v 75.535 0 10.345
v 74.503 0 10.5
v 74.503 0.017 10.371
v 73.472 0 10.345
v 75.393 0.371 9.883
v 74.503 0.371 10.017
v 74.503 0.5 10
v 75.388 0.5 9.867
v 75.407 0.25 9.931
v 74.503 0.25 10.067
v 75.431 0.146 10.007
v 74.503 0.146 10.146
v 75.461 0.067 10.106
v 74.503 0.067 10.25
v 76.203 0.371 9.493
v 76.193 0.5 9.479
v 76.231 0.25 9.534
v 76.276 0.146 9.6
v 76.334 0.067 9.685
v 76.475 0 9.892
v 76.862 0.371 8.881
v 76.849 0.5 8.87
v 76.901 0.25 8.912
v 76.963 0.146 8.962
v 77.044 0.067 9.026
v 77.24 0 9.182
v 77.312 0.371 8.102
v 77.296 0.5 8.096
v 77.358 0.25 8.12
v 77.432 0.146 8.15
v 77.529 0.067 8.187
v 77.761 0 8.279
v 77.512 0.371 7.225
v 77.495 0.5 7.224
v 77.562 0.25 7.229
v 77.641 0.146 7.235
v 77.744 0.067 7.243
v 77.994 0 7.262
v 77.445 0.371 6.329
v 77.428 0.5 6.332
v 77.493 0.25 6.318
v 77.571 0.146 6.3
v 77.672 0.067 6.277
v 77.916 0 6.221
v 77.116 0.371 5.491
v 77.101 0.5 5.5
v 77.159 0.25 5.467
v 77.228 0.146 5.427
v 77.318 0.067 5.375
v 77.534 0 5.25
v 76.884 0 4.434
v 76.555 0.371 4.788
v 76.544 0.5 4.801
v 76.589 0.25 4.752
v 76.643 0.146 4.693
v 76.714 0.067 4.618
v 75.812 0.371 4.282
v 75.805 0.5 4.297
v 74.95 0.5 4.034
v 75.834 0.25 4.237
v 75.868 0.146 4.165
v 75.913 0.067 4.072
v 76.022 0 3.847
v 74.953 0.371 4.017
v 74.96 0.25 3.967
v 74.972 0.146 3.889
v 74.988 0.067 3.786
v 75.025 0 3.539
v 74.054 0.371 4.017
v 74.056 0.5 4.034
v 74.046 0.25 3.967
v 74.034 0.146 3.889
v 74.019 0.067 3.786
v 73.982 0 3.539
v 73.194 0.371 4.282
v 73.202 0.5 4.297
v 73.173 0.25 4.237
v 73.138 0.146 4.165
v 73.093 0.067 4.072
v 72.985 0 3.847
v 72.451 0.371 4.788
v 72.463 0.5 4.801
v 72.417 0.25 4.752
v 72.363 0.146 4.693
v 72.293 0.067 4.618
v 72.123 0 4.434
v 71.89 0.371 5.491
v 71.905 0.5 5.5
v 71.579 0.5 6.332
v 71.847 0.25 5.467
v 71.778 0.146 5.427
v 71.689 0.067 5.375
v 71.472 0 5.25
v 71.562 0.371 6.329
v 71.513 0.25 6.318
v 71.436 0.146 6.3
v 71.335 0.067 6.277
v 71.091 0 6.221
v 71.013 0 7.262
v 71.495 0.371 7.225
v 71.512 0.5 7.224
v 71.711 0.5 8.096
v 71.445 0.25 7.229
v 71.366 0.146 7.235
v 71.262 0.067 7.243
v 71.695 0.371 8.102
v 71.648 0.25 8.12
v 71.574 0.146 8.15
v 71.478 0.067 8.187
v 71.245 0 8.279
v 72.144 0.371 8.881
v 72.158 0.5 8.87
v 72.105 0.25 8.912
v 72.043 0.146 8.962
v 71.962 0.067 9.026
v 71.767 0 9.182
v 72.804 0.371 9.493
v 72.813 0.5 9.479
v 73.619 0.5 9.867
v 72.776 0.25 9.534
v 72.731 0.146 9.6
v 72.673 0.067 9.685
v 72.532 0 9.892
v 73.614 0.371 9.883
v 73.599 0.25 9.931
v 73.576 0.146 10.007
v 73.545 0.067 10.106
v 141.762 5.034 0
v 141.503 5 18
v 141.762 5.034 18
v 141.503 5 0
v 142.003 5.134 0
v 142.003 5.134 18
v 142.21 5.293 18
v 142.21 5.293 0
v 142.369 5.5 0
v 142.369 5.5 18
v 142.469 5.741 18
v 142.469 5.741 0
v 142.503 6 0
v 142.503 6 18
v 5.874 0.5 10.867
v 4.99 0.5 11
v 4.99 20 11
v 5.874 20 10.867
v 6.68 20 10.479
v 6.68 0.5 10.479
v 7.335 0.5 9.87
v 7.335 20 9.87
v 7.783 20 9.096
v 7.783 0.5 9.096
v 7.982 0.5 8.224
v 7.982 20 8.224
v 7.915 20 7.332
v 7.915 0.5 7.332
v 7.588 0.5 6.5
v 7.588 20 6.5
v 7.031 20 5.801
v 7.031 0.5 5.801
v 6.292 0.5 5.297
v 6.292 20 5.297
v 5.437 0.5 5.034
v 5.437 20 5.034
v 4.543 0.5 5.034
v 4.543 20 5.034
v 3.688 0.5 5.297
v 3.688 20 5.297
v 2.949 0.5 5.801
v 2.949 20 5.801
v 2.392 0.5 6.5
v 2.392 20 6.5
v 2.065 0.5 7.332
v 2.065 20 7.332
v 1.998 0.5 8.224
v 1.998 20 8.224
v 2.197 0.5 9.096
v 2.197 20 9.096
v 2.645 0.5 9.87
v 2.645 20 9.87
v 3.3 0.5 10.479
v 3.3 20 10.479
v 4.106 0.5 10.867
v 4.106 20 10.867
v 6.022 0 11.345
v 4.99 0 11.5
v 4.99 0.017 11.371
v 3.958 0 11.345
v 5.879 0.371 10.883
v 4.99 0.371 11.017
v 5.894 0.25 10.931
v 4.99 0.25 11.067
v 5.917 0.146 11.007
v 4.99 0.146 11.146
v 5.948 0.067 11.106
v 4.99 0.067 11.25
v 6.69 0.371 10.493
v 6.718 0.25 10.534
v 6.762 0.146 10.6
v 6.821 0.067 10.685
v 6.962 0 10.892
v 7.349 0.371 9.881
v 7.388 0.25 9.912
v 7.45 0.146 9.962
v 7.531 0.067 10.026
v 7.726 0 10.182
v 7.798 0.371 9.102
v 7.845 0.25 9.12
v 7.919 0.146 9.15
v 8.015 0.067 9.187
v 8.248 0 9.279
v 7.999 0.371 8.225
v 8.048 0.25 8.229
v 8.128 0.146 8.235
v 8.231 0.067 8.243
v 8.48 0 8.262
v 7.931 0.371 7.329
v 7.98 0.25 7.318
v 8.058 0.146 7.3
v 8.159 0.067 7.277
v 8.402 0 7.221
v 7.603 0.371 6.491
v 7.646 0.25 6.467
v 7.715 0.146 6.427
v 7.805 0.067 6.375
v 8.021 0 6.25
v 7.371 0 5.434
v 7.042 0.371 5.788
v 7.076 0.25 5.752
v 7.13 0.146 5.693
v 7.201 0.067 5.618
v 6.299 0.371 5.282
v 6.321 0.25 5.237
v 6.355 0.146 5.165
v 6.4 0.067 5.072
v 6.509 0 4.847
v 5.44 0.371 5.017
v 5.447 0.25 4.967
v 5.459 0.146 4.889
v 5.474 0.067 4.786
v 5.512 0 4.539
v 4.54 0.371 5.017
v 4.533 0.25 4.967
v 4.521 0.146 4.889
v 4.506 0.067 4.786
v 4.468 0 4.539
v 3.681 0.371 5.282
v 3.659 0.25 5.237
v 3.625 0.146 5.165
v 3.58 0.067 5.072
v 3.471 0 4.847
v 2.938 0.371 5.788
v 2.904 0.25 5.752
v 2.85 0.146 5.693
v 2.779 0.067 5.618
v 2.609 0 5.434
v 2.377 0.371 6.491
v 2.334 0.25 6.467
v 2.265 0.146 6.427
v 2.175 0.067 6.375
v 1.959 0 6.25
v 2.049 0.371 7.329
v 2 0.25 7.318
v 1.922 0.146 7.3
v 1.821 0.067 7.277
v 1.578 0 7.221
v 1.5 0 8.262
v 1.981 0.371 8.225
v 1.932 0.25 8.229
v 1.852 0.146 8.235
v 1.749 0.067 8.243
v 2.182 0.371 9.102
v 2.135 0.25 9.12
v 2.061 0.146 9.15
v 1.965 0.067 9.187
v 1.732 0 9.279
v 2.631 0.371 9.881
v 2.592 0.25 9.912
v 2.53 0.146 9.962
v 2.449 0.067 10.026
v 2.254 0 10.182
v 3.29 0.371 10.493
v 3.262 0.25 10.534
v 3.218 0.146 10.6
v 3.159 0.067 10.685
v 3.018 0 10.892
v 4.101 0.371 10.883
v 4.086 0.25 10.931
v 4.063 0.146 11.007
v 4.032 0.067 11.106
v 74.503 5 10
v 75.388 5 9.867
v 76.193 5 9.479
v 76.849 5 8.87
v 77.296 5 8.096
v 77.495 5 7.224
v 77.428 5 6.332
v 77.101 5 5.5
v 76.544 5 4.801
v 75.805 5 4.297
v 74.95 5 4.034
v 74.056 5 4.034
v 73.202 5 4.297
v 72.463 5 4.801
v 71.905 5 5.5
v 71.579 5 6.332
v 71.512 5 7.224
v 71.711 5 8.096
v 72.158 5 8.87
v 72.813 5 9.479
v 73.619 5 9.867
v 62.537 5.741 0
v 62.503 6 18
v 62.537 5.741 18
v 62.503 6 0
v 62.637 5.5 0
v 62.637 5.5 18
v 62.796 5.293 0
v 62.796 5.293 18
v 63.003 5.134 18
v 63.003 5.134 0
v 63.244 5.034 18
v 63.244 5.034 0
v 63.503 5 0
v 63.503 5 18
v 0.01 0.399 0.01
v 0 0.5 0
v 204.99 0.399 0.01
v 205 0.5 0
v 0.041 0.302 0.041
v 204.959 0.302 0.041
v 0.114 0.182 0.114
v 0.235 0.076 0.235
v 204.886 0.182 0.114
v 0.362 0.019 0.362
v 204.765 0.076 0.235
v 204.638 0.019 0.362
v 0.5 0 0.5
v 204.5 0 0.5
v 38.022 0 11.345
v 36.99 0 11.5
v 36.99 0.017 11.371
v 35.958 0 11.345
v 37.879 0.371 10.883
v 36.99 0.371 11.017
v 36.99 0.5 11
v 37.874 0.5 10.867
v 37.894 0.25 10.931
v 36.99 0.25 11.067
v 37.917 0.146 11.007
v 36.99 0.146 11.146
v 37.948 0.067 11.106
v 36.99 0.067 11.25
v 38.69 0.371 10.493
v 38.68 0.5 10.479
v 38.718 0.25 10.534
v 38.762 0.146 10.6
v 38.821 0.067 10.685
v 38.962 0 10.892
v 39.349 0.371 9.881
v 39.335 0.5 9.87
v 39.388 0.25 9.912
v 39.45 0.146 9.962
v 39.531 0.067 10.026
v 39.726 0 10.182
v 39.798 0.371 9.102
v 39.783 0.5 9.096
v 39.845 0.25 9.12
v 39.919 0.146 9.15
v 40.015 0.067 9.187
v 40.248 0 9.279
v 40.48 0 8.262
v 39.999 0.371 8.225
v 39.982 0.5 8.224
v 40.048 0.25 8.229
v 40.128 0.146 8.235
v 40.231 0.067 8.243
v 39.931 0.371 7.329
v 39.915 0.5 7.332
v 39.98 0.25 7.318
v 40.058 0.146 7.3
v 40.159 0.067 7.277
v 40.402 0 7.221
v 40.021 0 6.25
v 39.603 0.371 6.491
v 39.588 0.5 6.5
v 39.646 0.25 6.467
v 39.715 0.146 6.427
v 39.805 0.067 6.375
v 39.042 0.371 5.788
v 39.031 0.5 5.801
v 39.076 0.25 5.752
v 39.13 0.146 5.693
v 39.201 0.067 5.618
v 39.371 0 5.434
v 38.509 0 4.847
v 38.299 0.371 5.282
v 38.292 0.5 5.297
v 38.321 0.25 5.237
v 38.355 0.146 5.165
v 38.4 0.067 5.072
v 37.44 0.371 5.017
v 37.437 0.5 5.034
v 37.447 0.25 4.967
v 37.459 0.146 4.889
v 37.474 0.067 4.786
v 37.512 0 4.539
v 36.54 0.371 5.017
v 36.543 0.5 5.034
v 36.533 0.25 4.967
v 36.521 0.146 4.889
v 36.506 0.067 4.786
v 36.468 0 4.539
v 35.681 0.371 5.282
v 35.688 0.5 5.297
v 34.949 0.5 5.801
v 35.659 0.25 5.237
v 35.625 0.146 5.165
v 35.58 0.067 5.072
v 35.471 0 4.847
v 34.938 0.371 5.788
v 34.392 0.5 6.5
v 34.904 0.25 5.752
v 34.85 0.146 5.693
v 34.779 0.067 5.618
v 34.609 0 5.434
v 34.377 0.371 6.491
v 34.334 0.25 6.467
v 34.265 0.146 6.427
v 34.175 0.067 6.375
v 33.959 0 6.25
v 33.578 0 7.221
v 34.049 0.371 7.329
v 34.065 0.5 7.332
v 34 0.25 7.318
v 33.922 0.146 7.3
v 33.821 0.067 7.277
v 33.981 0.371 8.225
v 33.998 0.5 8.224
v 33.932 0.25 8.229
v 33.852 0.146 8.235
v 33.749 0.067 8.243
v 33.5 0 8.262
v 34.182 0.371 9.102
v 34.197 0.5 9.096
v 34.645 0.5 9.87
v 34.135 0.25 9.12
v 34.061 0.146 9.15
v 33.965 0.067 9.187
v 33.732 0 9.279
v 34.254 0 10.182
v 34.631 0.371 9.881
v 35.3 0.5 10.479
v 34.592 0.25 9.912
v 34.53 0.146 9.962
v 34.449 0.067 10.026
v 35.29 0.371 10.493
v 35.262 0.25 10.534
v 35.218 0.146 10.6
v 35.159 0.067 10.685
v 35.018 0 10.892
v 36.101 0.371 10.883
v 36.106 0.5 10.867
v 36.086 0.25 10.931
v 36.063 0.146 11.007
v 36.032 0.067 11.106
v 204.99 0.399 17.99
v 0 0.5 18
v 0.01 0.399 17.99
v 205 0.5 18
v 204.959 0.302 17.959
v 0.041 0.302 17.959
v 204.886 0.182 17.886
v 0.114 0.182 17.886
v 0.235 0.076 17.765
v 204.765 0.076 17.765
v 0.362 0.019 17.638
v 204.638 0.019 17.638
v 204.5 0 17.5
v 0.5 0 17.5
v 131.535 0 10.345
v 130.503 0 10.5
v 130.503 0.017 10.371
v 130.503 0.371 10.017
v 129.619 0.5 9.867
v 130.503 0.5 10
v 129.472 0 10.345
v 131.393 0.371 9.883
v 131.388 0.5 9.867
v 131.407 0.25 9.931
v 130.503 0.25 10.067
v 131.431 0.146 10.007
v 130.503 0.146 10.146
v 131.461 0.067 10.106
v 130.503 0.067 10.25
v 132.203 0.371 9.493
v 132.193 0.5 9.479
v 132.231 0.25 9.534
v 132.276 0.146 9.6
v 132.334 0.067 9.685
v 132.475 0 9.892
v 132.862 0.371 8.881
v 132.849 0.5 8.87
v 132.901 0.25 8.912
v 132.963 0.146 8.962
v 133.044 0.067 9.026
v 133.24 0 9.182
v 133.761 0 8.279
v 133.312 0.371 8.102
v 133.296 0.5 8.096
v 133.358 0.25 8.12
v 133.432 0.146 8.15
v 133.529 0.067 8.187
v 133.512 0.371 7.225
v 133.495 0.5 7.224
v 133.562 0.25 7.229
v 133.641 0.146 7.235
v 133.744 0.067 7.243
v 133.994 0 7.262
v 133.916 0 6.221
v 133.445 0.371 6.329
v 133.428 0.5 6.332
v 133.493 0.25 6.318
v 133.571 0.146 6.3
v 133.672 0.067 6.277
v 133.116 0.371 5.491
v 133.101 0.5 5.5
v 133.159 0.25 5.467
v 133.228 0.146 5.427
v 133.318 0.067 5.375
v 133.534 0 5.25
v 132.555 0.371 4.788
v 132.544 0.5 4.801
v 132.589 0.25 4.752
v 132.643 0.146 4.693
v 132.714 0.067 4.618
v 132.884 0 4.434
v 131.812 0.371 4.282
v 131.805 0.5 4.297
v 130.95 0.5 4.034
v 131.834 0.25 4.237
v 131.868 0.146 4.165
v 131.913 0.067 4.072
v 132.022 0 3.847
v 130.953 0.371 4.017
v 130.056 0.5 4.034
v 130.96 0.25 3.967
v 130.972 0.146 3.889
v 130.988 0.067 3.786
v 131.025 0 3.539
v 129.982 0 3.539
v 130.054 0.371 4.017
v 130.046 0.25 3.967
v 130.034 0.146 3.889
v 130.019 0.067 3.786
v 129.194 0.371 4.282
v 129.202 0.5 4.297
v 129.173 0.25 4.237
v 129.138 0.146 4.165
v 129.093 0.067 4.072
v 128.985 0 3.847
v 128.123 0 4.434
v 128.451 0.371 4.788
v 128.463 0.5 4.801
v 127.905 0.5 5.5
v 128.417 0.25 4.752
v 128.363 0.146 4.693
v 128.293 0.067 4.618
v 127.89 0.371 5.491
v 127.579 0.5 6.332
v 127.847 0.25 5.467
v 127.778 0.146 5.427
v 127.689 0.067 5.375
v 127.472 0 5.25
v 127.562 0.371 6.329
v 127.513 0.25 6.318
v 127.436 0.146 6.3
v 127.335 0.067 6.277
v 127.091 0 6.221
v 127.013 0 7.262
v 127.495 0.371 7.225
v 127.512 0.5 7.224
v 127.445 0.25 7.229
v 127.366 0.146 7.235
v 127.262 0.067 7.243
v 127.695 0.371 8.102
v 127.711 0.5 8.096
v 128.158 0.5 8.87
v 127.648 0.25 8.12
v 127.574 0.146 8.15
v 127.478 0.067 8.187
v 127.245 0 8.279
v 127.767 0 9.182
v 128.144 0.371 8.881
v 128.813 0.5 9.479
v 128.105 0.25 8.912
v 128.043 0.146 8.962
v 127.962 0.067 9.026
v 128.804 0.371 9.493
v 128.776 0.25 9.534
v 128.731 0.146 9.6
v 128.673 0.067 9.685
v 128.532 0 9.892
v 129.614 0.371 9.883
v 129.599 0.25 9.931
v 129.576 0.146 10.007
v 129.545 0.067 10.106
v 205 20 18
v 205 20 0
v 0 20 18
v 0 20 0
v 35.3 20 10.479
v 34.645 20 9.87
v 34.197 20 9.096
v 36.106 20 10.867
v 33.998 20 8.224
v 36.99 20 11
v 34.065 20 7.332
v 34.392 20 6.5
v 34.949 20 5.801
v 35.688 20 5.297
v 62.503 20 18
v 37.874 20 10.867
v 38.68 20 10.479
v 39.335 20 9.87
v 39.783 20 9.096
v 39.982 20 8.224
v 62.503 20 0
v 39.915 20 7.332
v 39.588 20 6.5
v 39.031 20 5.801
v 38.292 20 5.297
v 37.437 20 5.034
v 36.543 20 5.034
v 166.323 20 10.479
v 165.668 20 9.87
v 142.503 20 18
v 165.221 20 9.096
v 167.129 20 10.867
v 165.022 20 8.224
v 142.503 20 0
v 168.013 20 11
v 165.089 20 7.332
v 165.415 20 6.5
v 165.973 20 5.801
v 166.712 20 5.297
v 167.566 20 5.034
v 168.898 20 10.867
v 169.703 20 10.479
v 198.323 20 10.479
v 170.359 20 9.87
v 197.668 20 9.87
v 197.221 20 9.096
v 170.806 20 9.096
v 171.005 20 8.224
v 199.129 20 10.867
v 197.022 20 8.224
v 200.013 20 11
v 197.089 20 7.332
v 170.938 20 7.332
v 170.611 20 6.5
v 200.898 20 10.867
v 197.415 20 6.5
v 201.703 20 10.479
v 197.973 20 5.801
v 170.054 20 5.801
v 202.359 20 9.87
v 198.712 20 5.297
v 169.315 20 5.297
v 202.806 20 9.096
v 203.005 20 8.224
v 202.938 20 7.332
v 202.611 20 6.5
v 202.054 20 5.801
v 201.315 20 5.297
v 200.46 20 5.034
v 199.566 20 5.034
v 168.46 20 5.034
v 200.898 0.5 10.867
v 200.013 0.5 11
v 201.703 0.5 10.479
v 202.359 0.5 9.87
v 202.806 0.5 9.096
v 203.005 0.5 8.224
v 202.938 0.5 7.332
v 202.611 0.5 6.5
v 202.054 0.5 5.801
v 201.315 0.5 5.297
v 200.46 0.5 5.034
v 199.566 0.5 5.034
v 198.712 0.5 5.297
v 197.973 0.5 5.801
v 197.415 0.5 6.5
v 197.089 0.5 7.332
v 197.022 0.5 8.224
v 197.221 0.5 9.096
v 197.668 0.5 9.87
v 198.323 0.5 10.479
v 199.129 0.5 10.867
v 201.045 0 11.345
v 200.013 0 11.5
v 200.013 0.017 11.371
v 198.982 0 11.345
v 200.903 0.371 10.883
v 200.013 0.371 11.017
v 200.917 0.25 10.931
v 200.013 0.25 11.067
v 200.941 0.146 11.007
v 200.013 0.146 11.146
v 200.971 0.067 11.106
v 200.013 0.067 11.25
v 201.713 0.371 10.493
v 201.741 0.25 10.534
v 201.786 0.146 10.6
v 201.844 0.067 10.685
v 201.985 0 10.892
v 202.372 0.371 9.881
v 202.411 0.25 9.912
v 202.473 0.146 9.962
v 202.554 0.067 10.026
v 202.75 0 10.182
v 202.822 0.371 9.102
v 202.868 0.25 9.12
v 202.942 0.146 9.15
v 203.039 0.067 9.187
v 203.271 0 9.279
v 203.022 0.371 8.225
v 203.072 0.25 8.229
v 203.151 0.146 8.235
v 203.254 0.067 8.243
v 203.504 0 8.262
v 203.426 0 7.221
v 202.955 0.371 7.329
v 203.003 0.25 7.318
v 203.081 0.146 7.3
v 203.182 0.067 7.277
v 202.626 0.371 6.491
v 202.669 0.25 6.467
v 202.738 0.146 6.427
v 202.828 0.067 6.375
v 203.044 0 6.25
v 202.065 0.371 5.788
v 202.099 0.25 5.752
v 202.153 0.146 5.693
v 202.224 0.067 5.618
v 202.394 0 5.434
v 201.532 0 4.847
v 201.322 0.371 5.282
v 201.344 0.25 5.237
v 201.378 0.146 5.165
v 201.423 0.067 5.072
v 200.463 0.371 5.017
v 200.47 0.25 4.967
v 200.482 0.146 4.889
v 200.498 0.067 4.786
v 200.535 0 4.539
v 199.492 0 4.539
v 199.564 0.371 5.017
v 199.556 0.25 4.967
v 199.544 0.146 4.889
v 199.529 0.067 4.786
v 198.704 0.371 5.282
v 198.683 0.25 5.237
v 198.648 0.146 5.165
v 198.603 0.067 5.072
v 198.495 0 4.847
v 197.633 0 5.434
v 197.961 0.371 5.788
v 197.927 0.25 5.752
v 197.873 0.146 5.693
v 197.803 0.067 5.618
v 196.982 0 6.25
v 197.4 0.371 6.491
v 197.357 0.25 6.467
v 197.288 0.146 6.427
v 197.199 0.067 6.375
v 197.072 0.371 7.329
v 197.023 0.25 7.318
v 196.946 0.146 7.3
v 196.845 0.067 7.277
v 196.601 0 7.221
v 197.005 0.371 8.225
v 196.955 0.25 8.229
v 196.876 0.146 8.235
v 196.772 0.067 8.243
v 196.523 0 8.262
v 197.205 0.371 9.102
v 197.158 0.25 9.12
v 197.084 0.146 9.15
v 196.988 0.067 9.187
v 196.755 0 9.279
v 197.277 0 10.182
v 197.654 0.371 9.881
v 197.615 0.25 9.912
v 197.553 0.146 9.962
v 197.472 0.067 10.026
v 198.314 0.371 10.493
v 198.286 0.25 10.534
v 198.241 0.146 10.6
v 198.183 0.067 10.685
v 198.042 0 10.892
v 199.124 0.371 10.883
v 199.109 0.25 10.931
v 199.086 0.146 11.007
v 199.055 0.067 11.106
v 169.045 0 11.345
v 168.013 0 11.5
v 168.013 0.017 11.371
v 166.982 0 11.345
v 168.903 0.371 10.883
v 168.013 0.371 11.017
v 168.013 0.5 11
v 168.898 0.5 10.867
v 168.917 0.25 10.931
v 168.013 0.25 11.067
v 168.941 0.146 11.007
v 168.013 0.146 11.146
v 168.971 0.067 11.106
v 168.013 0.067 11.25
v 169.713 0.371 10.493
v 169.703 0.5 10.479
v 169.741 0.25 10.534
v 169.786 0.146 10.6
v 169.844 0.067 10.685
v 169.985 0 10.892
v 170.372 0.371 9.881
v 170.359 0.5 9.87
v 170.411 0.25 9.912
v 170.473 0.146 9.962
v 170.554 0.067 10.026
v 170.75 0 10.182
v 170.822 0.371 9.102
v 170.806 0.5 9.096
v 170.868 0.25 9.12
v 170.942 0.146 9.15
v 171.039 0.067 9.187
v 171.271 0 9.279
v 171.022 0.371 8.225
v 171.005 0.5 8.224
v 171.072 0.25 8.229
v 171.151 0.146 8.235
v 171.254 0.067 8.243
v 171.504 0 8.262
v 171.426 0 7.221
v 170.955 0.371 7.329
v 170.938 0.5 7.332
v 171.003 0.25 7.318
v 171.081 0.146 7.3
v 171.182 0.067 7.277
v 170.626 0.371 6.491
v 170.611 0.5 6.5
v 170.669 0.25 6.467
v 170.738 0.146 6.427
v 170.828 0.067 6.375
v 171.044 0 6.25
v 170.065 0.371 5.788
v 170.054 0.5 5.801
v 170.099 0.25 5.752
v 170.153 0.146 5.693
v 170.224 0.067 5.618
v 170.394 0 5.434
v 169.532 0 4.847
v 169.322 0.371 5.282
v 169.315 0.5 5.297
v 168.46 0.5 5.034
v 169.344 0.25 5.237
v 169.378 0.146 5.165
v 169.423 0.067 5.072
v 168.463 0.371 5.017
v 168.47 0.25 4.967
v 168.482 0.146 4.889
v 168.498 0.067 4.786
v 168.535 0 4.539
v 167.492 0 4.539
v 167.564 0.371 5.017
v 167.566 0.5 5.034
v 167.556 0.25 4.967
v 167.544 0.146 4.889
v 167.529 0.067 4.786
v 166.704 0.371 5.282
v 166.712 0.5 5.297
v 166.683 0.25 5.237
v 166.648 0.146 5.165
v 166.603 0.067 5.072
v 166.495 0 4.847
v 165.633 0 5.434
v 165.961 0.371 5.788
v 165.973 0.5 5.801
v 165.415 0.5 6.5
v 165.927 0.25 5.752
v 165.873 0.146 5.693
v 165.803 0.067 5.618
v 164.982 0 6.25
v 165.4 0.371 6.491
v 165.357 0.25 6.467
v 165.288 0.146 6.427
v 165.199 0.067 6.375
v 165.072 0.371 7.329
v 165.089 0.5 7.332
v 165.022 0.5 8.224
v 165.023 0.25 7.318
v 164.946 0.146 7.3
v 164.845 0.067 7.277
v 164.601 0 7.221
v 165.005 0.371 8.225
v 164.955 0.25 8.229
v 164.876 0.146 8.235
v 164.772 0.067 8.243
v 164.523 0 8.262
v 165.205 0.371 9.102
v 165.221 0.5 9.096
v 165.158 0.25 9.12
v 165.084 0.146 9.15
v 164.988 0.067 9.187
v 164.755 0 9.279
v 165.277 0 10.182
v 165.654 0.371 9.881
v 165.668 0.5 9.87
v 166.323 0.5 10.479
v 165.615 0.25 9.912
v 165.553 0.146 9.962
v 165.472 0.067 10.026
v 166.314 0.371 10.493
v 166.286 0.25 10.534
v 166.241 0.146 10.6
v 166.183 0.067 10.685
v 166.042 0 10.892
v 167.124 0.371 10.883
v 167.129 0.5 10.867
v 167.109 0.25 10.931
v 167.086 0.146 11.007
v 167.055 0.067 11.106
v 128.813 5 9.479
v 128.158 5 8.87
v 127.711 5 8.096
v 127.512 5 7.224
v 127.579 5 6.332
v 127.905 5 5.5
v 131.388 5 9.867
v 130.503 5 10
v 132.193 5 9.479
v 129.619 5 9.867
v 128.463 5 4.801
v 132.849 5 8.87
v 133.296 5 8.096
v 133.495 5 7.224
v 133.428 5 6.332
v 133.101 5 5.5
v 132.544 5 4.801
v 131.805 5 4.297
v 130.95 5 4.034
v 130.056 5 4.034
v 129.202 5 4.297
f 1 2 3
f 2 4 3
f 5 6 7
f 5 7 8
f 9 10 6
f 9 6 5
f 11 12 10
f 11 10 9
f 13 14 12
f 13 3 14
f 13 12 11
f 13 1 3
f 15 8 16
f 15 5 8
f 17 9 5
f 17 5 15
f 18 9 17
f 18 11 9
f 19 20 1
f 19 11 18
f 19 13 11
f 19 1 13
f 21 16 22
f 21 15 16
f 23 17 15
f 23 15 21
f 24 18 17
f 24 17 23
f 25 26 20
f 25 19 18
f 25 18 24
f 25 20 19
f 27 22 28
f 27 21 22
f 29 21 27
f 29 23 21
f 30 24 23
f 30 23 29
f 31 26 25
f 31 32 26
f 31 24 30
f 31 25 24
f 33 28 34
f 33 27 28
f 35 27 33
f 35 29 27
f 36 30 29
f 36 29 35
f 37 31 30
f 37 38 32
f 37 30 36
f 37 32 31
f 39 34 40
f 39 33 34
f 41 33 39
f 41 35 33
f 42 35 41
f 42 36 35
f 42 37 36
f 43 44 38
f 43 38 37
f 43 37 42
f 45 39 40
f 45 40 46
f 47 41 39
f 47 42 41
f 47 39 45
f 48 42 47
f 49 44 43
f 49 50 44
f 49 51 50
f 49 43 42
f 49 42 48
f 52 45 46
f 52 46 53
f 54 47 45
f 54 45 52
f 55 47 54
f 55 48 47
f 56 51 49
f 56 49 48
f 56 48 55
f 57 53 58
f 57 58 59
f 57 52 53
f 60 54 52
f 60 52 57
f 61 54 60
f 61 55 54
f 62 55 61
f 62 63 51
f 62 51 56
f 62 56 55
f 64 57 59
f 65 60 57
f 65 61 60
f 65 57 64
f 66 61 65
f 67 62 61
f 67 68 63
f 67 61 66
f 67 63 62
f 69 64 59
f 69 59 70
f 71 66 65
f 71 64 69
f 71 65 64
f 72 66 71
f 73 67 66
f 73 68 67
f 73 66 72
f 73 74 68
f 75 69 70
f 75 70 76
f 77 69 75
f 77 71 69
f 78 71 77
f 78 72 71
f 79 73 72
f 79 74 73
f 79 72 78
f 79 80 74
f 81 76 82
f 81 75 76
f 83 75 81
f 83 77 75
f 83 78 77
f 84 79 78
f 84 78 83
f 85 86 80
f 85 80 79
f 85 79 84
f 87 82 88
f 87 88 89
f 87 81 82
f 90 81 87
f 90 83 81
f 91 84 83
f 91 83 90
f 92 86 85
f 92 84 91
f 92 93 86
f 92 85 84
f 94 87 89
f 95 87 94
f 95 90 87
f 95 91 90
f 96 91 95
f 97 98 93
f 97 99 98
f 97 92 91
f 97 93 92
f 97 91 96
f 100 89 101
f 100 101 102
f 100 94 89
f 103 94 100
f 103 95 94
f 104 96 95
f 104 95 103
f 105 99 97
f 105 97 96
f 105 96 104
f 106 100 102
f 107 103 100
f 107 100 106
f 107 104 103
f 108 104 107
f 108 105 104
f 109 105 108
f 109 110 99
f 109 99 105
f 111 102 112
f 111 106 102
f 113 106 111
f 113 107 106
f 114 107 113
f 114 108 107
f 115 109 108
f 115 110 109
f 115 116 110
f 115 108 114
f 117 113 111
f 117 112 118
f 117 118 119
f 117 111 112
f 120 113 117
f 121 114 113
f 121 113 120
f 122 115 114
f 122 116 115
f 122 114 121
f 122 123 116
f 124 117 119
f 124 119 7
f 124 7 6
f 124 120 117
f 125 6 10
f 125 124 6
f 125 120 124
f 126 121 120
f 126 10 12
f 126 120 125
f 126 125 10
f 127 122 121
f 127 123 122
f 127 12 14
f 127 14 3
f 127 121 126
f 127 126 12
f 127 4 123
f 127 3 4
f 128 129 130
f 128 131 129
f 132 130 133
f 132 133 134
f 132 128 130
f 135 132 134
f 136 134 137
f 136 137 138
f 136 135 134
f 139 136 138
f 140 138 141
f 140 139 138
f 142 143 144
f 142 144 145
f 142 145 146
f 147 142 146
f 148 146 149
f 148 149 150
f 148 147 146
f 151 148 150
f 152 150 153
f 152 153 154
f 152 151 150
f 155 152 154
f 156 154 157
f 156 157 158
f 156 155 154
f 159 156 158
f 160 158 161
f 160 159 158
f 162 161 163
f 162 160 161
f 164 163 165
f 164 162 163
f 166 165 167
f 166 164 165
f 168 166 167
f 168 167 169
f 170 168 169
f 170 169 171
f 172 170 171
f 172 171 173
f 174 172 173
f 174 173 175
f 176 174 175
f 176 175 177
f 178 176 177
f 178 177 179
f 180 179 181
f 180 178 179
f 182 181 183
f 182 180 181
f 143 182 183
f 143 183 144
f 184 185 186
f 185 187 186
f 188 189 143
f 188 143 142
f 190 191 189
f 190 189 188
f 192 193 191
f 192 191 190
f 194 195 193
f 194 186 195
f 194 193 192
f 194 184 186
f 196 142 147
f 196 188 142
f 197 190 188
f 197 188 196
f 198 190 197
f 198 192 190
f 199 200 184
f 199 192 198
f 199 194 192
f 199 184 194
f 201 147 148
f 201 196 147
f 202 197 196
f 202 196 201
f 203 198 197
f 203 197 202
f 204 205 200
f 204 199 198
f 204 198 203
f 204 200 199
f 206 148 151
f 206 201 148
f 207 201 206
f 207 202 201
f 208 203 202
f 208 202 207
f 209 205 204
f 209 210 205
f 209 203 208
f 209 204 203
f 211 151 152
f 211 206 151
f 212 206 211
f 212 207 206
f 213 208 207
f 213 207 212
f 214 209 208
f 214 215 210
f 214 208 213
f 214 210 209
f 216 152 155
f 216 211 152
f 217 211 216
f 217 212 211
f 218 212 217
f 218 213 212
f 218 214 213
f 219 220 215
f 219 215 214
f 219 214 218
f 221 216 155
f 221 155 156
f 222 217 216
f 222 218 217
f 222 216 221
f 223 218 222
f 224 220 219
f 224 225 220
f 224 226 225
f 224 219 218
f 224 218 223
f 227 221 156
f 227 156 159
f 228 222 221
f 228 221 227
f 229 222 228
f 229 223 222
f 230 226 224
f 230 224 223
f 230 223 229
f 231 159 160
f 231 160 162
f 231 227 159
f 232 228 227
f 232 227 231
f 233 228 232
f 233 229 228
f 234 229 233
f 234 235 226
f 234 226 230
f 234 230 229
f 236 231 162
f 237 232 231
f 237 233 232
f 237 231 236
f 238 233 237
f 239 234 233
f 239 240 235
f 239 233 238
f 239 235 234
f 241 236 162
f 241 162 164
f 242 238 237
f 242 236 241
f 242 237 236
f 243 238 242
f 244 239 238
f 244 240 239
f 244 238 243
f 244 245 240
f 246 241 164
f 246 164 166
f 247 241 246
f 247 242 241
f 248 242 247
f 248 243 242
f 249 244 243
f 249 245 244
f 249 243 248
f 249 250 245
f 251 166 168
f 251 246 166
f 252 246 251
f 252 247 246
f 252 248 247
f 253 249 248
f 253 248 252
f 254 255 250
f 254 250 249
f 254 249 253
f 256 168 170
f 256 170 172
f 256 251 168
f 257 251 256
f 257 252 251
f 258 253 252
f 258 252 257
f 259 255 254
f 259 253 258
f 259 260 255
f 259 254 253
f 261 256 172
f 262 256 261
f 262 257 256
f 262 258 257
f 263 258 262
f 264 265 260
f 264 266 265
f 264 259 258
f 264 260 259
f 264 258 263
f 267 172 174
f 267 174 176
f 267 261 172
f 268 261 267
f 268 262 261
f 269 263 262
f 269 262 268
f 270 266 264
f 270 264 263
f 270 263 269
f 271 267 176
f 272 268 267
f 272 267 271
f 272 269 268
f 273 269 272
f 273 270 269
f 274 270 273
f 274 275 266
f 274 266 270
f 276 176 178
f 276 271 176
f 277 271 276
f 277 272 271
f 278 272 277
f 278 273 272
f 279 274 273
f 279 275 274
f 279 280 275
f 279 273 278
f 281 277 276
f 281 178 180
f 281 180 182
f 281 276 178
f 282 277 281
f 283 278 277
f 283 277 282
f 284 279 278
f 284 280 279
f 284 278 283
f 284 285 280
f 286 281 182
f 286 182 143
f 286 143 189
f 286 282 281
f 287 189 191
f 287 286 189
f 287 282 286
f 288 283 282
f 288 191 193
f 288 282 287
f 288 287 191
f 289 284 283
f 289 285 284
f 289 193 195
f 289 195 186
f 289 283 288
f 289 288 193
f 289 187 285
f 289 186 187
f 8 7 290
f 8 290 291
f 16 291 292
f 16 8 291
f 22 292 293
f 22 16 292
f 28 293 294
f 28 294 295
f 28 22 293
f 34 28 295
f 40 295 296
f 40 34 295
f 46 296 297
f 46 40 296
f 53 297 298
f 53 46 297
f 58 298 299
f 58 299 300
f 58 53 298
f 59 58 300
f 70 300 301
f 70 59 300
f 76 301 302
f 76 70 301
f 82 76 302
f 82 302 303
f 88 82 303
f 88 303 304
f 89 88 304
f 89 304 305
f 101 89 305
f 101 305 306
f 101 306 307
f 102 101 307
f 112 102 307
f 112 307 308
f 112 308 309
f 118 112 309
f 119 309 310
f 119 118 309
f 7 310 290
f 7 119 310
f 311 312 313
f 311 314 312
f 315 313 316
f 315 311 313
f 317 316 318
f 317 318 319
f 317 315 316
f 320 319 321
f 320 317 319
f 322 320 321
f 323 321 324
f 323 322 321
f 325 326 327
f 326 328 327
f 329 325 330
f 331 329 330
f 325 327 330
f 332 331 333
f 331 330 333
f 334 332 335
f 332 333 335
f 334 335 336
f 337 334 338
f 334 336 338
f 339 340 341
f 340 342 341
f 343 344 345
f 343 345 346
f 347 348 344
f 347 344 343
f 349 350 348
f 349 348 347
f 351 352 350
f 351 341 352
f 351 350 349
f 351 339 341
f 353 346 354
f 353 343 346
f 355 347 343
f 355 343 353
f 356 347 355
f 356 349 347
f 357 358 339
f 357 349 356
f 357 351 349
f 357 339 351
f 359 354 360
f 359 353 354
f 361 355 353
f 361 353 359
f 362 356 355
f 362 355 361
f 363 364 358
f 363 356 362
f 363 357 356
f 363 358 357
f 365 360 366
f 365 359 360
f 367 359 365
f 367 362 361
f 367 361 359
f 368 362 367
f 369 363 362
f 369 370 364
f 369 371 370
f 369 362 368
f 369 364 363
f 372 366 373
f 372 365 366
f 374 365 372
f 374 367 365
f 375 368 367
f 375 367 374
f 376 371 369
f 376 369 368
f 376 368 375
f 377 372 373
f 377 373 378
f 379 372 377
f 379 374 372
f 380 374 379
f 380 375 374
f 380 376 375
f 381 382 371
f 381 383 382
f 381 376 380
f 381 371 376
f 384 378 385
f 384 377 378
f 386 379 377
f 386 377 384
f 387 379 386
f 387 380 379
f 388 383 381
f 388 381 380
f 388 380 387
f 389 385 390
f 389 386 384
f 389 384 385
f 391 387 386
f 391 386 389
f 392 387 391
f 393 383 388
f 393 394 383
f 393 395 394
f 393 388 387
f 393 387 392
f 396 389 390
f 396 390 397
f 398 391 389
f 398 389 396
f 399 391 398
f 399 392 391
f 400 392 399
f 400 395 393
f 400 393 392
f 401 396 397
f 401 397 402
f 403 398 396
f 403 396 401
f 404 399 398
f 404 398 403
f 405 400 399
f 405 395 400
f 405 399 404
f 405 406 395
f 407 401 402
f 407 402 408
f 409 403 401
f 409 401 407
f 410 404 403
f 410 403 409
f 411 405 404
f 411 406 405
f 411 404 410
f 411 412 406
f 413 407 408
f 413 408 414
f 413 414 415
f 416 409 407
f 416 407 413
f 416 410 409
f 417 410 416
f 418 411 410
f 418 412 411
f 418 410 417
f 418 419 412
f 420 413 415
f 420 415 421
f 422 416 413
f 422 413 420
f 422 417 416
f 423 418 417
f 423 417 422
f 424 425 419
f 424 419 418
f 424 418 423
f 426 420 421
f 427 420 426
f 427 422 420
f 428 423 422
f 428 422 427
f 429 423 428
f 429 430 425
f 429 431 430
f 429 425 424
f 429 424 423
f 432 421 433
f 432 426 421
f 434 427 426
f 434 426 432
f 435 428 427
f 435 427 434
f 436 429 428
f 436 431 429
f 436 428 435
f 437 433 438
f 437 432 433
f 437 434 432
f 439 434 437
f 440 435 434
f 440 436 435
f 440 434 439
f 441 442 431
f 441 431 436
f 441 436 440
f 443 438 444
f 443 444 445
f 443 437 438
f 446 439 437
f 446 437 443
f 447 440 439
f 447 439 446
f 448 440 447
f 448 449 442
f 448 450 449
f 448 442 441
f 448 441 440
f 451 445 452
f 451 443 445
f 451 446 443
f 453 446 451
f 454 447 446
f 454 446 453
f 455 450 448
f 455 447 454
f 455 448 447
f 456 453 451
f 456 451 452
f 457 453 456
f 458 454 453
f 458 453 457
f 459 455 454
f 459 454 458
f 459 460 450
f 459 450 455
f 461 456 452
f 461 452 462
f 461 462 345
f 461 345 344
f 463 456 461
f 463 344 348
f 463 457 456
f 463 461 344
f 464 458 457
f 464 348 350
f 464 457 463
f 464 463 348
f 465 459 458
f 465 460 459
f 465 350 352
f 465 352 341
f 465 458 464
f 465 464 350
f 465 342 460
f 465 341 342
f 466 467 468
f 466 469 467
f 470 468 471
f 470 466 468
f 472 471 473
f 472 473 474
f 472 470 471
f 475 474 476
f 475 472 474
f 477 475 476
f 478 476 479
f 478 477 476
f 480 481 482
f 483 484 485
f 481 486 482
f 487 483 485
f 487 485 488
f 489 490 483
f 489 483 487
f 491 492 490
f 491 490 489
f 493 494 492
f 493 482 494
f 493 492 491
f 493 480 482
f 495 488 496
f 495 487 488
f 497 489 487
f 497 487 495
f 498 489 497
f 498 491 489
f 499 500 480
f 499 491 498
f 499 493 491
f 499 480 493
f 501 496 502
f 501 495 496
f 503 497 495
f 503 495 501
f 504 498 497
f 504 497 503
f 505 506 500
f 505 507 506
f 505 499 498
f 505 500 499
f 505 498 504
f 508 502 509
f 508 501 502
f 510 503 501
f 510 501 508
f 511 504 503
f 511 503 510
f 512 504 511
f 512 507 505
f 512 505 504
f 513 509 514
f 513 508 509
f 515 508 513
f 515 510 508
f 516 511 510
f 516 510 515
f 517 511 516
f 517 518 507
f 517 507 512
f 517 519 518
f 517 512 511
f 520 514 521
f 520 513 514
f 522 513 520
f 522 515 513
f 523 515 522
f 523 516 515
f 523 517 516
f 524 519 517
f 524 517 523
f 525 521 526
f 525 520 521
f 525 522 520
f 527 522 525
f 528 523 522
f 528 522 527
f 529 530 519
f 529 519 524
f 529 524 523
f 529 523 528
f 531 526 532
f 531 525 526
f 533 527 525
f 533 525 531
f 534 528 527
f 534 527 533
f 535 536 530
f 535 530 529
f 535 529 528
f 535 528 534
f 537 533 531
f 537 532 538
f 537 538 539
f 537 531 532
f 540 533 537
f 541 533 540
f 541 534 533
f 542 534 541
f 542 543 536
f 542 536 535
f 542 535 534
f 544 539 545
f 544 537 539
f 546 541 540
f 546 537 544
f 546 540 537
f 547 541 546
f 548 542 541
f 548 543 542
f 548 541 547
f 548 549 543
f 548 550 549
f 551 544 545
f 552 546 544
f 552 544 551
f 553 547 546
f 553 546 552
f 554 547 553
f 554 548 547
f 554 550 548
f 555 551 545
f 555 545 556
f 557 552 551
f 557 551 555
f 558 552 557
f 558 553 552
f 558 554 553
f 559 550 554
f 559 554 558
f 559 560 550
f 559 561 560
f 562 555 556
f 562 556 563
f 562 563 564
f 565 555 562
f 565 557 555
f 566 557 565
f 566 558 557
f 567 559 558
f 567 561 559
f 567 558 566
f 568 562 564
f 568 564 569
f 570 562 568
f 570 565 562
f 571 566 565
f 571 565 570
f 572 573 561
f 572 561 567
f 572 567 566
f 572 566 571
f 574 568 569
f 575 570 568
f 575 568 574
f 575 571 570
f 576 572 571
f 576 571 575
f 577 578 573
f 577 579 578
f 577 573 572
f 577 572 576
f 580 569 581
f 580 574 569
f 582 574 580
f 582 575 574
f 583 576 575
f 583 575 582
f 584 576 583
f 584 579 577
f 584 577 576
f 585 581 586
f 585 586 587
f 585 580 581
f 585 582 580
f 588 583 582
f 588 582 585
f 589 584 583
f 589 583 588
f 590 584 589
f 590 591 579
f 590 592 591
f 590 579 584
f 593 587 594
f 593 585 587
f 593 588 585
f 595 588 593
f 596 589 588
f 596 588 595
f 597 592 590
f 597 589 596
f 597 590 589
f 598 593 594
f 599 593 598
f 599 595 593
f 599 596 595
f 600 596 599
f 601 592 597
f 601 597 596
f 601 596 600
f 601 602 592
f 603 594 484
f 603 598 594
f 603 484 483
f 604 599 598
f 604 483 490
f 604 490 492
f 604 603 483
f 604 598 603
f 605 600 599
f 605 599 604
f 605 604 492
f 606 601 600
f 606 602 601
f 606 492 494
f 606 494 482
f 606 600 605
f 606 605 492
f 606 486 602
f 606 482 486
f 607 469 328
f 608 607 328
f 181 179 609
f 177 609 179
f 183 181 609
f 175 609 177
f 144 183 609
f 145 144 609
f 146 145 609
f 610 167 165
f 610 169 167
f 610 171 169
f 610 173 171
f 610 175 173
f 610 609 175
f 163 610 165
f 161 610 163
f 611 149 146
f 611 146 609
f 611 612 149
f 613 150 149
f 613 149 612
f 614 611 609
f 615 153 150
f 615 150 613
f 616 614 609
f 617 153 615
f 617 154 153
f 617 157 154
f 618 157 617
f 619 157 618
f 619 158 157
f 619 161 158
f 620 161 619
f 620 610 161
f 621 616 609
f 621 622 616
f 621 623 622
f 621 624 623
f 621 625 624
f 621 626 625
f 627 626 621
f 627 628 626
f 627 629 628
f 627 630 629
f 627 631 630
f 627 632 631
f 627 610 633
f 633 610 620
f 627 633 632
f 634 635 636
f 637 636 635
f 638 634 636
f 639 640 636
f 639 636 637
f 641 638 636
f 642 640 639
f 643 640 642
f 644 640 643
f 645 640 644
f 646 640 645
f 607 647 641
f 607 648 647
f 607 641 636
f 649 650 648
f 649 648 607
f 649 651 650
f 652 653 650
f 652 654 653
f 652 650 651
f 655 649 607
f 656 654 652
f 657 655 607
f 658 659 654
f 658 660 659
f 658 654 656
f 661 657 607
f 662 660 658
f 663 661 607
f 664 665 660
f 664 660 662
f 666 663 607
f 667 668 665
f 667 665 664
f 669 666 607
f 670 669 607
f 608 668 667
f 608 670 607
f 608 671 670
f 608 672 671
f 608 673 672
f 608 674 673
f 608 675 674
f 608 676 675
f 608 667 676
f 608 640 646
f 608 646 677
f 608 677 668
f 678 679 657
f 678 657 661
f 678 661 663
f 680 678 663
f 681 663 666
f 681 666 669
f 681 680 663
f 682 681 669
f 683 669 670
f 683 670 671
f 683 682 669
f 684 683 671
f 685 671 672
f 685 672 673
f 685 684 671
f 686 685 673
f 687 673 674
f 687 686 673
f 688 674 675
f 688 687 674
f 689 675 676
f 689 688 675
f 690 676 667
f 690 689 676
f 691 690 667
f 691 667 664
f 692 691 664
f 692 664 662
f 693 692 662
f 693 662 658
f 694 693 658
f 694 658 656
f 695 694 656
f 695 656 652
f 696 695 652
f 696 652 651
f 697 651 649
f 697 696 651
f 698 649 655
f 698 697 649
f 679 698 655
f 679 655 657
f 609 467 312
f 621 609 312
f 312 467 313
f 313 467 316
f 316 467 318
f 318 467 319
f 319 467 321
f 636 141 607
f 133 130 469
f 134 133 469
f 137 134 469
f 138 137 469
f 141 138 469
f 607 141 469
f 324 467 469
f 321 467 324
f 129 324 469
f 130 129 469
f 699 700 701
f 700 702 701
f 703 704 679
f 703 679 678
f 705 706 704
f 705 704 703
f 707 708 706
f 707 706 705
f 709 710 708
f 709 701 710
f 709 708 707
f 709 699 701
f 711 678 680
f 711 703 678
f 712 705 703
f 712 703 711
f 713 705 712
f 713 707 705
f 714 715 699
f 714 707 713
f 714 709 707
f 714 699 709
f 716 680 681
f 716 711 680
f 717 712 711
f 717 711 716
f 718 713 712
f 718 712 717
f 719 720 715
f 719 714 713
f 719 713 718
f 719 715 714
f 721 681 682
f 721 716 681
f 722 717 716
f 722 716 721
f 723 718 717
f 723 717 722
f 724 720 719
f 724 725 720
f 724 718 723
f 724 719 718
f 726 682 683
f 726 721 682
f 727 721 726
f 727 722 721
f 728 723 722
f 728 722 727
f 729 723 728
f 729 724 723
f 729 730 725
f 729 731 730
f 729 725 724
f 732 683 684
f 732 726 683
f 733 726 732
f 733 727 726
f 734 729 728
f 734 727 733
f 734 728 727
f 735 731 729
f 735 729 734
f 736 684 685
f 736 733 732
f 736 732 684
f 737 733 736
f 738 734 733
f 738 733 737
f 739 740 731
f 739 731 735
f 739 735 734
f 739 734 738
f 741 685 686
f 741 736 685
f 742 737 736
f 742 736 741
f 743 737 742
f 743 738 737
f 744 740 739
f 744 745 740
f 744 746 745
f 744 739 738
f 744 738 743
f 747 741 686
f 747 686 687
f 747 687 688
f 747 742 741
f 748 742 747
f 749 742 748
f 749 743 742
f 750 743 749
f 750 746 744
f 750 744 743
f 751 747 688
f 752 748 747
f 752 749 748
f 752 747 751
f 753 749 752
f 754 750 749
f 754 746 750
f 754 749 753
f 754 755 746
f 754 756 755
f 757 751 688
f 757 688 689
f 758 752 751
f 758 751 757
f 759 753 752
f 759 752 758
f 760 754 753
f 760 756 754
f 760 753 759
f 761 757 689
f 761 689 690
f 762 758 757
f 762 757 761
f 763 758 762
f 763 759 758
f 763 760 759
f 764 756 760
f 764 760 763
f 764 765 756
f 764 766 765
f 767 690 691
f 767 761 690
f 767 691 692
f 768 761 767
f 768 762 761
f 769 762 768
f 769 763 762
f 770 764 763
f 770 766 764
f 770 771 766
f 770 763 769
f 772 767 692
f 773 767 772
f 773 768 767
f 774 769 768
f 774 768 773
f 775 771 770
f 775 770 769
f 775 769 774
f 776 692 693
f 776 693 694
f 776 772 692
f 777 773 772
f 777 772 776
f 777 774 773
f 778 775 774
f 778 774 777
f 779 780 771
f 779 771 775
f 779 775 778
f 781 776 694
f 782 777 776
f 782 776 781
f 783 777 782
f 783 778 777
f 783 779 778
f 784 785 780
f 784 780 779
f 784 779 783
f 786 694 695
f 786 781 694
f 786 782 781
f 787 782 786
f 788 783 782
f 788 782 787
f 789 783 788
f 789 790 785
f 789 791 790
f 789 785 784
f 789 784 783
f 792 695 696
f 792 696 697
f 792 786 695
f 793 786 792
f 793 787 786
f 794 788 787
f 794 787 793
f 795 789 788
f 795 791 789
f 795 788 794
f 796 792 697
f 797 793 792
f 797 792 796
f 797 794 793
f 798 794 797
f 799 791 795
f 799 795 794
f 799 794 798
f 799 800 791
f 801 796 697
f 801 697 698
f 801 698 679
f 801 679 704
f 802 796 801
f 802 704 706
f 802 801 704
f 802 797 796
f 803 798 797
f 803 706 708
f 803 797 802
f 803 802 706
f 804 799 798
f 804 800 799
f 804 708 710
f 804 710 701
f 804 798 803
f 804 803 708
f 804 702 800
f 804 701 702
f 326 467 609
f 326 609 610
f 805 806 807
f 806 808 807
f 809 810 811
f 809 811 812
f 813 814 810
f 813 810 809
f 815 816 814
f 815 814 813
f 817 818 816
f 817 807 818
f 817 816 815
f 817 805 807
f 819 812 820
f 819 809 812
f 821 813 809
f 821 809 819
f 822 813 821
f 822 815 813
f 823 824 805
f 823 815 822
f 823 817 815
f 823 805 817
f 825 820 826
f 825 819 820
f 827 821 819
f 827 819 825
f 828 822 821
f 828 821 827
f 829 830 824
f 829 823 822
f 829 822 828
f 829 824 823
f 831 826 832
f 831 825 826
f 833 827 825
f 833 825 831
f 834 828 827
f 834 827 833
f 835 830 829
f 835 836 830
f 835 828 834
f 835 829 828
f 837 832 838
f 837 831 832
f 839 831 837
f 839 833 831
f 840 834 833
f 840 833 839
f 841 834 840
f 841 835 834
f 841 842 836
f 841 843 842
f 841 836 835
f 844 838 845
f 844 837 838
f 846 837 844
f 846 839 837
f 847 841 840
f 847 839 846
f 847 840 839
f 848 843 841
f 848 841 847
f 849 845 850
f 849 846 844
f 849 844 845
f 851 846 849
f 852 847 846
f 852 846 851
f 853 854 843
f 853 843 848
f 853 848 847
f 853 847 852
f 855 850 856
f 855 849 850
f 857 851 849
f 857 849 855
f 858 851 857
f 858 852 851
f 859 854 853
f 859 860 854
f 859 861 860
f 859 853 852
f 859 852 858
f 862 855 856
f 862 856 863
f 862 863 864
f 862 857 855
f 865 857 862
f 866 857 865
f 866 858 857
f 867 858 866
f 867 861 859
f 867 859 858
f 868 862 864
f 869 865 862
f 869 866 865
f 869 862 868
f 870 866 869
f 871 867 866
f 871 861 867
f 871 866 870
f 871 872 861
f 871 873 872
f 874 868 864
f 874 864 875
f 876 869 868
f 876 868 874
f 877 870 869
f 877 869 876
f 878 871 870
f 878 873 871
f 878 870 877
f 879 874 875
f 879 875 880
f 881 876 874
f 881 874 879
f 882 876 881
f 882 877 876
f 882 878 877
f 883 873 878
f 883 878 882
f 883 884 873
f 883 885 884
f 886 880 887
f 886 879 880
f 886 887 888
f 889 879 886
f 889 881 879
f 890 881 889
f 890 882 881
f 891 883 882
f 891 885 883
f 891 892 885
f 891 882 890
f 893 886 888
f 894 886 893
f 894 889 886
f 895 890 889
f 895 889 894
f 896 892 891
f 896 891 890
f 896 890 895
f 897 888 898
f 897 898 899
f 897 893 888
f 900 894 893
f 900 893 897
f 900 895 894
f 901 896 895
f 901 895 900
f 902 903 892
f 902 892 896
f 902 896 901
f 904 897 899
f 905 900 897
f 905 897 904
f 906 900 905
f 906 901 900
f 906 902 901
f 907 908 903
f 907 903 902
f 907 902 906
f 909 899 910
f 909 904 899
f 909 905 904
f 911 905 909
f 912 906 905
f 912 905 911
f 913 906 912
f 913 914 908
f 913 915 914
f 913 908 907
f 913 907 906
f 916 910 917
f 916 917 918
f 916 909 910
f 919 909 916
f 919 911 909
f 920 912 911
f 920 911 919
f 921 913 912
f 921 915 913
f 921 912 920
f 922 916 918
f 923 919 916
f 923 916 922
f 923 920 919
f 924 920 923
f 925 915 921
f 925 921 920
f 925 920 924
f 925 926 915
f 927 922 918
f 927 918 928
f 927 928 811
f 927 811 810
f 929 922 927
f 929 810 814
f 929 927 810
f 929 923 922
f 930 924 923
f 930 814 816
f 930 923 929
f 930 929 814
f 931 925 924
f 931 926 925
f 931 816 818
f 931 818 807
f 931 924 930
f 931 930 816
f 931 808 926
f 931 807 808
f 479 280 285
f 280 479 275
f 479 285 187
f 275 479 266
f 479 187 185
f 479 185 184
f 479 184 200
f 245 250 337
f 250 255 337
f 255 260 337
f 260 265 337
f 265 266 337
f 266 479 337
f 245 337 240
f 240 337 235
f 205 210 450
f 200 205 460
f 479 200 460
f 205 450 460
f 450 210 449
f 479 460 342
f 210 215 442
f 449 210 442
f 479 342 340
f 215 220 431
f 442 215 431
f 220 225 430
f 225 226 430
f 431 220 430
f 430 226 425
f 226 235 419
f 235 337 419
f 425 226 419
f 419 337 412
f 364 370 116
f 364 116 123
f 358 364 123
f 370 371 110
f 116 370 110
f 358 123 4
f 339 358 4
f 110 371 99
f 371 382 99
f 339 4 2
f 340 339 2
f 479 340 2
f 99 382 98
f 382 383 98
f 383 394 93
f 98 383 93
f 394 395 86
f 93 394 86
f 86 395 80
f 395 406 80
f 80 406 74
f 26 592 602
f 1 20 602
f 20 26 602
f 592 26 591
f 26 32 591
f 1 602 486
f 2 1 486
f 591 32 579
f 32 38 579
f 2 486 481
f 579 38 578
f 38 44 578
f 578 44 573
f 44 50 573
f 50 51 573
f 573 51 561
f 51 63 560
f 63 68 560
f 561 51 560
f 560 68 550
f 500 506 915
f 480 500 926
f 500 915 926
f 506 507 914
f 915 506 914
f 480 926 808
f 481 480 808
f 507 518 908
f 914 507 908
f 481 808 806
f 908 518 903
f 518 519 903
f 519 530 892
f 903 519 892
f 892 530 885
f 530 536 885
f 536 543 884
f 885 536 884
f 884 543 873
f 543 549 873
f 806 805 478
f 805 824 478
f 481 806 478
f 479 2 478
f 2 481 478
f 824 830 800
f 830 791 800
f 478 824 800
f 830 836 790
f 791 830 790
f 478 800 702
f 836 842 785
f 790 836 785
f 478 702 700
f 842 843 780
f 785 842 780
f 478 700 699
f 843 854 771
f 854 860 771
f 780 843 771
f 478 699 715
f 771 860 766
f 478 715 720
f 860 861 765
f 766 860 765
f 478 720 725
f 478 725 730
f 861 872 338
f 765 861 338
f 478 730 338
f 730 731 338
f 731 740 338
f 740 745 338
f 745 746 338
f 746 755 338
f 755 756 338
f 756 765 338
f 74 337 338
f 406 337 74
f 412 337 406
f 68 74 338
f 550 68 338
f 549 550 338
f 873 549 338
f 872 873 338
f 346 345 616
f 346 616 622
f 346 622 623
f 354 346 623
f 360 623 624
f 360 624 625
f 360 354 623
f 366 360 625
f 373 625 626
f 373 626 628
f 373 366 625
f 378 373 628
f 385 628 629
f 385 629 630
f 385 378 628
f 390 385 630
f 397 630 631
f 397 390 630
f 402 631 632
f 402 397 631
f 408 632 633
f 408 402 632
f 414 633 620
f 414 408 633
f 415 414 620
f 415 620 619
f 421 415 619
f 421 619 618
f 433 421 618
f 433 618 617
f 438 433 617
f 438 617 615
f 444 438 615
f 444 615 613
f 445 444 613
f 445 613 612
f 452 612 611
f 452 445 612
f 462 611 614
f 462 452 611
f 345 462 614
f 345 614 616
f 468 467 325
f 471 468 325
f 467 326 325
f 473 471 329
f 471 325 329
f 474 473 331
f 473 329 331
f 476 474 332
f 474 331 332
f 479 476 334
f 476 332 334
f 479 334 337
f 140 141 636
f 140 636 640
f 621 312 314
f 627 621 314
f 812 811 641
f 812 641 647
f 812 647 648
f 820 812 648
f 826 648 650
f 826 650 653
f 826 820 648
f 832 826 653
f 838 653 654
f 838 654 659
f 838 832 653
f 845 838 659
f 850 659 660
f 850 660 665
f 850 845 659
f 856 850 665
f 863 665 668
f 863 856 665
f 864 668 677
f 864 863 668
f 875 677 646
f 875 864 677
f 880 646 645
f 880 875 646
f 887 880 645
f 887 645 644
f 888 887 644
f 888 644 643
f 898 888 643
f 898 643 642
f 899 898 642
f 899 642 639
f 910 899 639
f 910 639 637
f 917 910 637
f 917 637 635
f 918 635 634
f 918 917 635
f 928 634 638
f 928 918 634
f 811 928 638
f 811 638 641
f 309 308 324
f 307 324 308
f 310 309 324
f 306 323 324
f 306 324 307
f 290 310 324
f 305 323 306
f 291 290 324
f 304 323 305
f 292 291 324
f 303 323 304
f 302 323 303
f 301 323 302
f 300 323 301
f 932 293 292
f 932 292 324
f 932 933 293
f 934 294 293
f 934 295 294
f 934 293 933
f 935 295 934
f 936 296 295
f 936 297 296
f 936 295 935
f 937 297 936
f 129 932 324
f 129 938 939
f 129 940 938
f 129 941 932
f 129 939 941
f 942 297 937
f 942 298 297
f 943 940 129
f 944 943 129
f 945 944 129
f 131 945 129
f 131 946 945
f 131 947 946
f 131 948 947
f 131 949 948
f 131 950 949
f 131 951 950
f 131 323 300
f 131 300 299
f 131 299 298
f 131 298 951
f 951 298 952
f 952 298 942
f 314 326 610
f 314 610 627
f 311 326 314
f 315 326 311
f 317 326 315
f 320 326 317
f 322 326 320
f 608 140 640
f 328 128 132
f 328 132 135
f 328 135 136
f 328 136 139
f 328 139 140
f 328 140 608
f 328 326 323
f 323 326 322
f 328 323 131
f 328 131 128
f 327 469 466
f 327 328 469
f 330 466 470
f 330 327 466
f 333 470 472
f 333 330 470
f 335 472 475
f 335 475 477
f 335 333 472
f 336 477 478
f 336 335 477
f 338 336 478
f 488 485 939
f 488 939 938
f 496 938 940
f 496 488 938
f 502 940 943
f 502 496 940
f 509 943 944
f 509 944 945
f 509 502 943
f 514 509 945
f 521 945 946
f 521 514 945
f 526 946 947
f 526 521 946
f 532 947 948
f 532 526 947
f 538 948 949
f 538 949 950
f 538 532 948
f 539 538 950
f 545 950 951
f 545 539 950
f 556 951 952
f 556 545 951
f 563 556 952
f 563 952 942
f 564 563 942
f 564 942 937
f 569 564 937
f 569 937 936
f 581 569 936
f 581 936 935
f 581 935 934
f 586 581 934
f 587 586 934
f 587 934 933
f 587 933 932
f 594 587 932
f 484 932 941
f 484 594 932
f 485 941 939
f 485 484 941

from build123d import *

# Parameters (mm, degrees)
SKETCH1_W             = 62.4967
SKETCH1_H             = 18
SKETCH1_R             = 3
BOSS_EXTRUDE1_DEPTH   = 20
SKETCH1_W_2           = 62.5033
BOSS_EXTRUDE1_2_DEPTH = 20
SKETCH1_3_W           = 80
SKETCH1_3_H           = 18
SKETCH1_3_R           = 3
BOSS_EXTRUDE2_DEPTH   = 5
FILLET1_R             = 0.5
FILLET2_R             = 1


with BuildPart() as part:
    # Sketch1 → Boss-Extrude1 (new body)
    with BuildSketch(Plane(origin=(0, 0, 0), x_dir=(1, 0, 0), z_dir=(0, 1, 0))):
        with Locations((173.75165, -9)):
            Rectangle(SKETCH1_W, SKETCH1_H)
        with Locations((168.0133, -8)):
            Circle(SKETCH1_R, mode=Mode.SUBTRACT)
        with Locations((200.0133, -8)):
            Circle(SKETCH1_R, mode=Mode.SUBTRACT)
    extrude(amount=BOSS_EXTRUDE1_DEPTH)



with BuildPart() as body_2:
    # Sketch1 → Boss-Extrude1 2 (new body)
    with BuildSketch(Plane(origin=(0, 0, 0), x_dir=(1, 0, 0), z_dir=(0, 1, 0))):
        with Locations((31.25165, -9)):
            Rectangle(SKETCH1_W_2, SKETCH1_H)
        with Locations((4.99, -8)):
            Circle(SKETCH1_R, mode=Mode.SUBTRACT)
        with Locations((36.99, -8)):
            Circle(SKETCH1_R, mode=Mode.SUBTRACT)
    extrude(amount=BOSS_EXTRUDE1_2_DEPTH)


with BuildPart() as part_1:
    add(part.part)

    add(body_2.part)  # Boss-Extrude2 merges body 2
    # Sketch1<3> → Boss-Extrude2 (add)
    with BuildSketch(Plane(origin=(0, 0, 0), x_dir=(1, 0, 0), z_dir=(0, 1, 0))):
        with Locations((102.5033, -9)):
            Rectangle(SKETCH1_3_W, SKETCH1_3_H)
        with Locations((74.5033, -7)):
            Circle(SKETCH1_3_R, mode=Mode.SUBTRACT)
        with Locations((130.5033, -7)):
            Circle(SKETCH1_3_R, mode=Mode.SUBTRACT)
    extrude(amount=BOSS_EXTRUDE2_DEPTH)

    # Fillet1
    fillet1_edges = [part_1.edges().sort_by_distance(p)[0] for p in [
        (165.0133, 0, 8),
        (197.0133, 0, 8),
        (71.5033, 0, 7),
        (127.5033, 0, 7),
        (0, 0, 9),
        (102.5, 0, 18),
        (205, 0, 9),
        (102.5, 0, 0),
        (1.99, 0, 8),
        (33.99, 0, 8),
    ]]
    fillet(fillet1_edges, radius=FILLET1_R)

    # Fillet2
    fillet2_edges = [part_1.edges().sort_by_distance(p)[0] for p in [
        (62.5033, 5, 9),
        (142.5033, 5, 9),
    ]]
    fillet(fillet2_edges, radius=FILLET2_R)


solid = part_1.part
